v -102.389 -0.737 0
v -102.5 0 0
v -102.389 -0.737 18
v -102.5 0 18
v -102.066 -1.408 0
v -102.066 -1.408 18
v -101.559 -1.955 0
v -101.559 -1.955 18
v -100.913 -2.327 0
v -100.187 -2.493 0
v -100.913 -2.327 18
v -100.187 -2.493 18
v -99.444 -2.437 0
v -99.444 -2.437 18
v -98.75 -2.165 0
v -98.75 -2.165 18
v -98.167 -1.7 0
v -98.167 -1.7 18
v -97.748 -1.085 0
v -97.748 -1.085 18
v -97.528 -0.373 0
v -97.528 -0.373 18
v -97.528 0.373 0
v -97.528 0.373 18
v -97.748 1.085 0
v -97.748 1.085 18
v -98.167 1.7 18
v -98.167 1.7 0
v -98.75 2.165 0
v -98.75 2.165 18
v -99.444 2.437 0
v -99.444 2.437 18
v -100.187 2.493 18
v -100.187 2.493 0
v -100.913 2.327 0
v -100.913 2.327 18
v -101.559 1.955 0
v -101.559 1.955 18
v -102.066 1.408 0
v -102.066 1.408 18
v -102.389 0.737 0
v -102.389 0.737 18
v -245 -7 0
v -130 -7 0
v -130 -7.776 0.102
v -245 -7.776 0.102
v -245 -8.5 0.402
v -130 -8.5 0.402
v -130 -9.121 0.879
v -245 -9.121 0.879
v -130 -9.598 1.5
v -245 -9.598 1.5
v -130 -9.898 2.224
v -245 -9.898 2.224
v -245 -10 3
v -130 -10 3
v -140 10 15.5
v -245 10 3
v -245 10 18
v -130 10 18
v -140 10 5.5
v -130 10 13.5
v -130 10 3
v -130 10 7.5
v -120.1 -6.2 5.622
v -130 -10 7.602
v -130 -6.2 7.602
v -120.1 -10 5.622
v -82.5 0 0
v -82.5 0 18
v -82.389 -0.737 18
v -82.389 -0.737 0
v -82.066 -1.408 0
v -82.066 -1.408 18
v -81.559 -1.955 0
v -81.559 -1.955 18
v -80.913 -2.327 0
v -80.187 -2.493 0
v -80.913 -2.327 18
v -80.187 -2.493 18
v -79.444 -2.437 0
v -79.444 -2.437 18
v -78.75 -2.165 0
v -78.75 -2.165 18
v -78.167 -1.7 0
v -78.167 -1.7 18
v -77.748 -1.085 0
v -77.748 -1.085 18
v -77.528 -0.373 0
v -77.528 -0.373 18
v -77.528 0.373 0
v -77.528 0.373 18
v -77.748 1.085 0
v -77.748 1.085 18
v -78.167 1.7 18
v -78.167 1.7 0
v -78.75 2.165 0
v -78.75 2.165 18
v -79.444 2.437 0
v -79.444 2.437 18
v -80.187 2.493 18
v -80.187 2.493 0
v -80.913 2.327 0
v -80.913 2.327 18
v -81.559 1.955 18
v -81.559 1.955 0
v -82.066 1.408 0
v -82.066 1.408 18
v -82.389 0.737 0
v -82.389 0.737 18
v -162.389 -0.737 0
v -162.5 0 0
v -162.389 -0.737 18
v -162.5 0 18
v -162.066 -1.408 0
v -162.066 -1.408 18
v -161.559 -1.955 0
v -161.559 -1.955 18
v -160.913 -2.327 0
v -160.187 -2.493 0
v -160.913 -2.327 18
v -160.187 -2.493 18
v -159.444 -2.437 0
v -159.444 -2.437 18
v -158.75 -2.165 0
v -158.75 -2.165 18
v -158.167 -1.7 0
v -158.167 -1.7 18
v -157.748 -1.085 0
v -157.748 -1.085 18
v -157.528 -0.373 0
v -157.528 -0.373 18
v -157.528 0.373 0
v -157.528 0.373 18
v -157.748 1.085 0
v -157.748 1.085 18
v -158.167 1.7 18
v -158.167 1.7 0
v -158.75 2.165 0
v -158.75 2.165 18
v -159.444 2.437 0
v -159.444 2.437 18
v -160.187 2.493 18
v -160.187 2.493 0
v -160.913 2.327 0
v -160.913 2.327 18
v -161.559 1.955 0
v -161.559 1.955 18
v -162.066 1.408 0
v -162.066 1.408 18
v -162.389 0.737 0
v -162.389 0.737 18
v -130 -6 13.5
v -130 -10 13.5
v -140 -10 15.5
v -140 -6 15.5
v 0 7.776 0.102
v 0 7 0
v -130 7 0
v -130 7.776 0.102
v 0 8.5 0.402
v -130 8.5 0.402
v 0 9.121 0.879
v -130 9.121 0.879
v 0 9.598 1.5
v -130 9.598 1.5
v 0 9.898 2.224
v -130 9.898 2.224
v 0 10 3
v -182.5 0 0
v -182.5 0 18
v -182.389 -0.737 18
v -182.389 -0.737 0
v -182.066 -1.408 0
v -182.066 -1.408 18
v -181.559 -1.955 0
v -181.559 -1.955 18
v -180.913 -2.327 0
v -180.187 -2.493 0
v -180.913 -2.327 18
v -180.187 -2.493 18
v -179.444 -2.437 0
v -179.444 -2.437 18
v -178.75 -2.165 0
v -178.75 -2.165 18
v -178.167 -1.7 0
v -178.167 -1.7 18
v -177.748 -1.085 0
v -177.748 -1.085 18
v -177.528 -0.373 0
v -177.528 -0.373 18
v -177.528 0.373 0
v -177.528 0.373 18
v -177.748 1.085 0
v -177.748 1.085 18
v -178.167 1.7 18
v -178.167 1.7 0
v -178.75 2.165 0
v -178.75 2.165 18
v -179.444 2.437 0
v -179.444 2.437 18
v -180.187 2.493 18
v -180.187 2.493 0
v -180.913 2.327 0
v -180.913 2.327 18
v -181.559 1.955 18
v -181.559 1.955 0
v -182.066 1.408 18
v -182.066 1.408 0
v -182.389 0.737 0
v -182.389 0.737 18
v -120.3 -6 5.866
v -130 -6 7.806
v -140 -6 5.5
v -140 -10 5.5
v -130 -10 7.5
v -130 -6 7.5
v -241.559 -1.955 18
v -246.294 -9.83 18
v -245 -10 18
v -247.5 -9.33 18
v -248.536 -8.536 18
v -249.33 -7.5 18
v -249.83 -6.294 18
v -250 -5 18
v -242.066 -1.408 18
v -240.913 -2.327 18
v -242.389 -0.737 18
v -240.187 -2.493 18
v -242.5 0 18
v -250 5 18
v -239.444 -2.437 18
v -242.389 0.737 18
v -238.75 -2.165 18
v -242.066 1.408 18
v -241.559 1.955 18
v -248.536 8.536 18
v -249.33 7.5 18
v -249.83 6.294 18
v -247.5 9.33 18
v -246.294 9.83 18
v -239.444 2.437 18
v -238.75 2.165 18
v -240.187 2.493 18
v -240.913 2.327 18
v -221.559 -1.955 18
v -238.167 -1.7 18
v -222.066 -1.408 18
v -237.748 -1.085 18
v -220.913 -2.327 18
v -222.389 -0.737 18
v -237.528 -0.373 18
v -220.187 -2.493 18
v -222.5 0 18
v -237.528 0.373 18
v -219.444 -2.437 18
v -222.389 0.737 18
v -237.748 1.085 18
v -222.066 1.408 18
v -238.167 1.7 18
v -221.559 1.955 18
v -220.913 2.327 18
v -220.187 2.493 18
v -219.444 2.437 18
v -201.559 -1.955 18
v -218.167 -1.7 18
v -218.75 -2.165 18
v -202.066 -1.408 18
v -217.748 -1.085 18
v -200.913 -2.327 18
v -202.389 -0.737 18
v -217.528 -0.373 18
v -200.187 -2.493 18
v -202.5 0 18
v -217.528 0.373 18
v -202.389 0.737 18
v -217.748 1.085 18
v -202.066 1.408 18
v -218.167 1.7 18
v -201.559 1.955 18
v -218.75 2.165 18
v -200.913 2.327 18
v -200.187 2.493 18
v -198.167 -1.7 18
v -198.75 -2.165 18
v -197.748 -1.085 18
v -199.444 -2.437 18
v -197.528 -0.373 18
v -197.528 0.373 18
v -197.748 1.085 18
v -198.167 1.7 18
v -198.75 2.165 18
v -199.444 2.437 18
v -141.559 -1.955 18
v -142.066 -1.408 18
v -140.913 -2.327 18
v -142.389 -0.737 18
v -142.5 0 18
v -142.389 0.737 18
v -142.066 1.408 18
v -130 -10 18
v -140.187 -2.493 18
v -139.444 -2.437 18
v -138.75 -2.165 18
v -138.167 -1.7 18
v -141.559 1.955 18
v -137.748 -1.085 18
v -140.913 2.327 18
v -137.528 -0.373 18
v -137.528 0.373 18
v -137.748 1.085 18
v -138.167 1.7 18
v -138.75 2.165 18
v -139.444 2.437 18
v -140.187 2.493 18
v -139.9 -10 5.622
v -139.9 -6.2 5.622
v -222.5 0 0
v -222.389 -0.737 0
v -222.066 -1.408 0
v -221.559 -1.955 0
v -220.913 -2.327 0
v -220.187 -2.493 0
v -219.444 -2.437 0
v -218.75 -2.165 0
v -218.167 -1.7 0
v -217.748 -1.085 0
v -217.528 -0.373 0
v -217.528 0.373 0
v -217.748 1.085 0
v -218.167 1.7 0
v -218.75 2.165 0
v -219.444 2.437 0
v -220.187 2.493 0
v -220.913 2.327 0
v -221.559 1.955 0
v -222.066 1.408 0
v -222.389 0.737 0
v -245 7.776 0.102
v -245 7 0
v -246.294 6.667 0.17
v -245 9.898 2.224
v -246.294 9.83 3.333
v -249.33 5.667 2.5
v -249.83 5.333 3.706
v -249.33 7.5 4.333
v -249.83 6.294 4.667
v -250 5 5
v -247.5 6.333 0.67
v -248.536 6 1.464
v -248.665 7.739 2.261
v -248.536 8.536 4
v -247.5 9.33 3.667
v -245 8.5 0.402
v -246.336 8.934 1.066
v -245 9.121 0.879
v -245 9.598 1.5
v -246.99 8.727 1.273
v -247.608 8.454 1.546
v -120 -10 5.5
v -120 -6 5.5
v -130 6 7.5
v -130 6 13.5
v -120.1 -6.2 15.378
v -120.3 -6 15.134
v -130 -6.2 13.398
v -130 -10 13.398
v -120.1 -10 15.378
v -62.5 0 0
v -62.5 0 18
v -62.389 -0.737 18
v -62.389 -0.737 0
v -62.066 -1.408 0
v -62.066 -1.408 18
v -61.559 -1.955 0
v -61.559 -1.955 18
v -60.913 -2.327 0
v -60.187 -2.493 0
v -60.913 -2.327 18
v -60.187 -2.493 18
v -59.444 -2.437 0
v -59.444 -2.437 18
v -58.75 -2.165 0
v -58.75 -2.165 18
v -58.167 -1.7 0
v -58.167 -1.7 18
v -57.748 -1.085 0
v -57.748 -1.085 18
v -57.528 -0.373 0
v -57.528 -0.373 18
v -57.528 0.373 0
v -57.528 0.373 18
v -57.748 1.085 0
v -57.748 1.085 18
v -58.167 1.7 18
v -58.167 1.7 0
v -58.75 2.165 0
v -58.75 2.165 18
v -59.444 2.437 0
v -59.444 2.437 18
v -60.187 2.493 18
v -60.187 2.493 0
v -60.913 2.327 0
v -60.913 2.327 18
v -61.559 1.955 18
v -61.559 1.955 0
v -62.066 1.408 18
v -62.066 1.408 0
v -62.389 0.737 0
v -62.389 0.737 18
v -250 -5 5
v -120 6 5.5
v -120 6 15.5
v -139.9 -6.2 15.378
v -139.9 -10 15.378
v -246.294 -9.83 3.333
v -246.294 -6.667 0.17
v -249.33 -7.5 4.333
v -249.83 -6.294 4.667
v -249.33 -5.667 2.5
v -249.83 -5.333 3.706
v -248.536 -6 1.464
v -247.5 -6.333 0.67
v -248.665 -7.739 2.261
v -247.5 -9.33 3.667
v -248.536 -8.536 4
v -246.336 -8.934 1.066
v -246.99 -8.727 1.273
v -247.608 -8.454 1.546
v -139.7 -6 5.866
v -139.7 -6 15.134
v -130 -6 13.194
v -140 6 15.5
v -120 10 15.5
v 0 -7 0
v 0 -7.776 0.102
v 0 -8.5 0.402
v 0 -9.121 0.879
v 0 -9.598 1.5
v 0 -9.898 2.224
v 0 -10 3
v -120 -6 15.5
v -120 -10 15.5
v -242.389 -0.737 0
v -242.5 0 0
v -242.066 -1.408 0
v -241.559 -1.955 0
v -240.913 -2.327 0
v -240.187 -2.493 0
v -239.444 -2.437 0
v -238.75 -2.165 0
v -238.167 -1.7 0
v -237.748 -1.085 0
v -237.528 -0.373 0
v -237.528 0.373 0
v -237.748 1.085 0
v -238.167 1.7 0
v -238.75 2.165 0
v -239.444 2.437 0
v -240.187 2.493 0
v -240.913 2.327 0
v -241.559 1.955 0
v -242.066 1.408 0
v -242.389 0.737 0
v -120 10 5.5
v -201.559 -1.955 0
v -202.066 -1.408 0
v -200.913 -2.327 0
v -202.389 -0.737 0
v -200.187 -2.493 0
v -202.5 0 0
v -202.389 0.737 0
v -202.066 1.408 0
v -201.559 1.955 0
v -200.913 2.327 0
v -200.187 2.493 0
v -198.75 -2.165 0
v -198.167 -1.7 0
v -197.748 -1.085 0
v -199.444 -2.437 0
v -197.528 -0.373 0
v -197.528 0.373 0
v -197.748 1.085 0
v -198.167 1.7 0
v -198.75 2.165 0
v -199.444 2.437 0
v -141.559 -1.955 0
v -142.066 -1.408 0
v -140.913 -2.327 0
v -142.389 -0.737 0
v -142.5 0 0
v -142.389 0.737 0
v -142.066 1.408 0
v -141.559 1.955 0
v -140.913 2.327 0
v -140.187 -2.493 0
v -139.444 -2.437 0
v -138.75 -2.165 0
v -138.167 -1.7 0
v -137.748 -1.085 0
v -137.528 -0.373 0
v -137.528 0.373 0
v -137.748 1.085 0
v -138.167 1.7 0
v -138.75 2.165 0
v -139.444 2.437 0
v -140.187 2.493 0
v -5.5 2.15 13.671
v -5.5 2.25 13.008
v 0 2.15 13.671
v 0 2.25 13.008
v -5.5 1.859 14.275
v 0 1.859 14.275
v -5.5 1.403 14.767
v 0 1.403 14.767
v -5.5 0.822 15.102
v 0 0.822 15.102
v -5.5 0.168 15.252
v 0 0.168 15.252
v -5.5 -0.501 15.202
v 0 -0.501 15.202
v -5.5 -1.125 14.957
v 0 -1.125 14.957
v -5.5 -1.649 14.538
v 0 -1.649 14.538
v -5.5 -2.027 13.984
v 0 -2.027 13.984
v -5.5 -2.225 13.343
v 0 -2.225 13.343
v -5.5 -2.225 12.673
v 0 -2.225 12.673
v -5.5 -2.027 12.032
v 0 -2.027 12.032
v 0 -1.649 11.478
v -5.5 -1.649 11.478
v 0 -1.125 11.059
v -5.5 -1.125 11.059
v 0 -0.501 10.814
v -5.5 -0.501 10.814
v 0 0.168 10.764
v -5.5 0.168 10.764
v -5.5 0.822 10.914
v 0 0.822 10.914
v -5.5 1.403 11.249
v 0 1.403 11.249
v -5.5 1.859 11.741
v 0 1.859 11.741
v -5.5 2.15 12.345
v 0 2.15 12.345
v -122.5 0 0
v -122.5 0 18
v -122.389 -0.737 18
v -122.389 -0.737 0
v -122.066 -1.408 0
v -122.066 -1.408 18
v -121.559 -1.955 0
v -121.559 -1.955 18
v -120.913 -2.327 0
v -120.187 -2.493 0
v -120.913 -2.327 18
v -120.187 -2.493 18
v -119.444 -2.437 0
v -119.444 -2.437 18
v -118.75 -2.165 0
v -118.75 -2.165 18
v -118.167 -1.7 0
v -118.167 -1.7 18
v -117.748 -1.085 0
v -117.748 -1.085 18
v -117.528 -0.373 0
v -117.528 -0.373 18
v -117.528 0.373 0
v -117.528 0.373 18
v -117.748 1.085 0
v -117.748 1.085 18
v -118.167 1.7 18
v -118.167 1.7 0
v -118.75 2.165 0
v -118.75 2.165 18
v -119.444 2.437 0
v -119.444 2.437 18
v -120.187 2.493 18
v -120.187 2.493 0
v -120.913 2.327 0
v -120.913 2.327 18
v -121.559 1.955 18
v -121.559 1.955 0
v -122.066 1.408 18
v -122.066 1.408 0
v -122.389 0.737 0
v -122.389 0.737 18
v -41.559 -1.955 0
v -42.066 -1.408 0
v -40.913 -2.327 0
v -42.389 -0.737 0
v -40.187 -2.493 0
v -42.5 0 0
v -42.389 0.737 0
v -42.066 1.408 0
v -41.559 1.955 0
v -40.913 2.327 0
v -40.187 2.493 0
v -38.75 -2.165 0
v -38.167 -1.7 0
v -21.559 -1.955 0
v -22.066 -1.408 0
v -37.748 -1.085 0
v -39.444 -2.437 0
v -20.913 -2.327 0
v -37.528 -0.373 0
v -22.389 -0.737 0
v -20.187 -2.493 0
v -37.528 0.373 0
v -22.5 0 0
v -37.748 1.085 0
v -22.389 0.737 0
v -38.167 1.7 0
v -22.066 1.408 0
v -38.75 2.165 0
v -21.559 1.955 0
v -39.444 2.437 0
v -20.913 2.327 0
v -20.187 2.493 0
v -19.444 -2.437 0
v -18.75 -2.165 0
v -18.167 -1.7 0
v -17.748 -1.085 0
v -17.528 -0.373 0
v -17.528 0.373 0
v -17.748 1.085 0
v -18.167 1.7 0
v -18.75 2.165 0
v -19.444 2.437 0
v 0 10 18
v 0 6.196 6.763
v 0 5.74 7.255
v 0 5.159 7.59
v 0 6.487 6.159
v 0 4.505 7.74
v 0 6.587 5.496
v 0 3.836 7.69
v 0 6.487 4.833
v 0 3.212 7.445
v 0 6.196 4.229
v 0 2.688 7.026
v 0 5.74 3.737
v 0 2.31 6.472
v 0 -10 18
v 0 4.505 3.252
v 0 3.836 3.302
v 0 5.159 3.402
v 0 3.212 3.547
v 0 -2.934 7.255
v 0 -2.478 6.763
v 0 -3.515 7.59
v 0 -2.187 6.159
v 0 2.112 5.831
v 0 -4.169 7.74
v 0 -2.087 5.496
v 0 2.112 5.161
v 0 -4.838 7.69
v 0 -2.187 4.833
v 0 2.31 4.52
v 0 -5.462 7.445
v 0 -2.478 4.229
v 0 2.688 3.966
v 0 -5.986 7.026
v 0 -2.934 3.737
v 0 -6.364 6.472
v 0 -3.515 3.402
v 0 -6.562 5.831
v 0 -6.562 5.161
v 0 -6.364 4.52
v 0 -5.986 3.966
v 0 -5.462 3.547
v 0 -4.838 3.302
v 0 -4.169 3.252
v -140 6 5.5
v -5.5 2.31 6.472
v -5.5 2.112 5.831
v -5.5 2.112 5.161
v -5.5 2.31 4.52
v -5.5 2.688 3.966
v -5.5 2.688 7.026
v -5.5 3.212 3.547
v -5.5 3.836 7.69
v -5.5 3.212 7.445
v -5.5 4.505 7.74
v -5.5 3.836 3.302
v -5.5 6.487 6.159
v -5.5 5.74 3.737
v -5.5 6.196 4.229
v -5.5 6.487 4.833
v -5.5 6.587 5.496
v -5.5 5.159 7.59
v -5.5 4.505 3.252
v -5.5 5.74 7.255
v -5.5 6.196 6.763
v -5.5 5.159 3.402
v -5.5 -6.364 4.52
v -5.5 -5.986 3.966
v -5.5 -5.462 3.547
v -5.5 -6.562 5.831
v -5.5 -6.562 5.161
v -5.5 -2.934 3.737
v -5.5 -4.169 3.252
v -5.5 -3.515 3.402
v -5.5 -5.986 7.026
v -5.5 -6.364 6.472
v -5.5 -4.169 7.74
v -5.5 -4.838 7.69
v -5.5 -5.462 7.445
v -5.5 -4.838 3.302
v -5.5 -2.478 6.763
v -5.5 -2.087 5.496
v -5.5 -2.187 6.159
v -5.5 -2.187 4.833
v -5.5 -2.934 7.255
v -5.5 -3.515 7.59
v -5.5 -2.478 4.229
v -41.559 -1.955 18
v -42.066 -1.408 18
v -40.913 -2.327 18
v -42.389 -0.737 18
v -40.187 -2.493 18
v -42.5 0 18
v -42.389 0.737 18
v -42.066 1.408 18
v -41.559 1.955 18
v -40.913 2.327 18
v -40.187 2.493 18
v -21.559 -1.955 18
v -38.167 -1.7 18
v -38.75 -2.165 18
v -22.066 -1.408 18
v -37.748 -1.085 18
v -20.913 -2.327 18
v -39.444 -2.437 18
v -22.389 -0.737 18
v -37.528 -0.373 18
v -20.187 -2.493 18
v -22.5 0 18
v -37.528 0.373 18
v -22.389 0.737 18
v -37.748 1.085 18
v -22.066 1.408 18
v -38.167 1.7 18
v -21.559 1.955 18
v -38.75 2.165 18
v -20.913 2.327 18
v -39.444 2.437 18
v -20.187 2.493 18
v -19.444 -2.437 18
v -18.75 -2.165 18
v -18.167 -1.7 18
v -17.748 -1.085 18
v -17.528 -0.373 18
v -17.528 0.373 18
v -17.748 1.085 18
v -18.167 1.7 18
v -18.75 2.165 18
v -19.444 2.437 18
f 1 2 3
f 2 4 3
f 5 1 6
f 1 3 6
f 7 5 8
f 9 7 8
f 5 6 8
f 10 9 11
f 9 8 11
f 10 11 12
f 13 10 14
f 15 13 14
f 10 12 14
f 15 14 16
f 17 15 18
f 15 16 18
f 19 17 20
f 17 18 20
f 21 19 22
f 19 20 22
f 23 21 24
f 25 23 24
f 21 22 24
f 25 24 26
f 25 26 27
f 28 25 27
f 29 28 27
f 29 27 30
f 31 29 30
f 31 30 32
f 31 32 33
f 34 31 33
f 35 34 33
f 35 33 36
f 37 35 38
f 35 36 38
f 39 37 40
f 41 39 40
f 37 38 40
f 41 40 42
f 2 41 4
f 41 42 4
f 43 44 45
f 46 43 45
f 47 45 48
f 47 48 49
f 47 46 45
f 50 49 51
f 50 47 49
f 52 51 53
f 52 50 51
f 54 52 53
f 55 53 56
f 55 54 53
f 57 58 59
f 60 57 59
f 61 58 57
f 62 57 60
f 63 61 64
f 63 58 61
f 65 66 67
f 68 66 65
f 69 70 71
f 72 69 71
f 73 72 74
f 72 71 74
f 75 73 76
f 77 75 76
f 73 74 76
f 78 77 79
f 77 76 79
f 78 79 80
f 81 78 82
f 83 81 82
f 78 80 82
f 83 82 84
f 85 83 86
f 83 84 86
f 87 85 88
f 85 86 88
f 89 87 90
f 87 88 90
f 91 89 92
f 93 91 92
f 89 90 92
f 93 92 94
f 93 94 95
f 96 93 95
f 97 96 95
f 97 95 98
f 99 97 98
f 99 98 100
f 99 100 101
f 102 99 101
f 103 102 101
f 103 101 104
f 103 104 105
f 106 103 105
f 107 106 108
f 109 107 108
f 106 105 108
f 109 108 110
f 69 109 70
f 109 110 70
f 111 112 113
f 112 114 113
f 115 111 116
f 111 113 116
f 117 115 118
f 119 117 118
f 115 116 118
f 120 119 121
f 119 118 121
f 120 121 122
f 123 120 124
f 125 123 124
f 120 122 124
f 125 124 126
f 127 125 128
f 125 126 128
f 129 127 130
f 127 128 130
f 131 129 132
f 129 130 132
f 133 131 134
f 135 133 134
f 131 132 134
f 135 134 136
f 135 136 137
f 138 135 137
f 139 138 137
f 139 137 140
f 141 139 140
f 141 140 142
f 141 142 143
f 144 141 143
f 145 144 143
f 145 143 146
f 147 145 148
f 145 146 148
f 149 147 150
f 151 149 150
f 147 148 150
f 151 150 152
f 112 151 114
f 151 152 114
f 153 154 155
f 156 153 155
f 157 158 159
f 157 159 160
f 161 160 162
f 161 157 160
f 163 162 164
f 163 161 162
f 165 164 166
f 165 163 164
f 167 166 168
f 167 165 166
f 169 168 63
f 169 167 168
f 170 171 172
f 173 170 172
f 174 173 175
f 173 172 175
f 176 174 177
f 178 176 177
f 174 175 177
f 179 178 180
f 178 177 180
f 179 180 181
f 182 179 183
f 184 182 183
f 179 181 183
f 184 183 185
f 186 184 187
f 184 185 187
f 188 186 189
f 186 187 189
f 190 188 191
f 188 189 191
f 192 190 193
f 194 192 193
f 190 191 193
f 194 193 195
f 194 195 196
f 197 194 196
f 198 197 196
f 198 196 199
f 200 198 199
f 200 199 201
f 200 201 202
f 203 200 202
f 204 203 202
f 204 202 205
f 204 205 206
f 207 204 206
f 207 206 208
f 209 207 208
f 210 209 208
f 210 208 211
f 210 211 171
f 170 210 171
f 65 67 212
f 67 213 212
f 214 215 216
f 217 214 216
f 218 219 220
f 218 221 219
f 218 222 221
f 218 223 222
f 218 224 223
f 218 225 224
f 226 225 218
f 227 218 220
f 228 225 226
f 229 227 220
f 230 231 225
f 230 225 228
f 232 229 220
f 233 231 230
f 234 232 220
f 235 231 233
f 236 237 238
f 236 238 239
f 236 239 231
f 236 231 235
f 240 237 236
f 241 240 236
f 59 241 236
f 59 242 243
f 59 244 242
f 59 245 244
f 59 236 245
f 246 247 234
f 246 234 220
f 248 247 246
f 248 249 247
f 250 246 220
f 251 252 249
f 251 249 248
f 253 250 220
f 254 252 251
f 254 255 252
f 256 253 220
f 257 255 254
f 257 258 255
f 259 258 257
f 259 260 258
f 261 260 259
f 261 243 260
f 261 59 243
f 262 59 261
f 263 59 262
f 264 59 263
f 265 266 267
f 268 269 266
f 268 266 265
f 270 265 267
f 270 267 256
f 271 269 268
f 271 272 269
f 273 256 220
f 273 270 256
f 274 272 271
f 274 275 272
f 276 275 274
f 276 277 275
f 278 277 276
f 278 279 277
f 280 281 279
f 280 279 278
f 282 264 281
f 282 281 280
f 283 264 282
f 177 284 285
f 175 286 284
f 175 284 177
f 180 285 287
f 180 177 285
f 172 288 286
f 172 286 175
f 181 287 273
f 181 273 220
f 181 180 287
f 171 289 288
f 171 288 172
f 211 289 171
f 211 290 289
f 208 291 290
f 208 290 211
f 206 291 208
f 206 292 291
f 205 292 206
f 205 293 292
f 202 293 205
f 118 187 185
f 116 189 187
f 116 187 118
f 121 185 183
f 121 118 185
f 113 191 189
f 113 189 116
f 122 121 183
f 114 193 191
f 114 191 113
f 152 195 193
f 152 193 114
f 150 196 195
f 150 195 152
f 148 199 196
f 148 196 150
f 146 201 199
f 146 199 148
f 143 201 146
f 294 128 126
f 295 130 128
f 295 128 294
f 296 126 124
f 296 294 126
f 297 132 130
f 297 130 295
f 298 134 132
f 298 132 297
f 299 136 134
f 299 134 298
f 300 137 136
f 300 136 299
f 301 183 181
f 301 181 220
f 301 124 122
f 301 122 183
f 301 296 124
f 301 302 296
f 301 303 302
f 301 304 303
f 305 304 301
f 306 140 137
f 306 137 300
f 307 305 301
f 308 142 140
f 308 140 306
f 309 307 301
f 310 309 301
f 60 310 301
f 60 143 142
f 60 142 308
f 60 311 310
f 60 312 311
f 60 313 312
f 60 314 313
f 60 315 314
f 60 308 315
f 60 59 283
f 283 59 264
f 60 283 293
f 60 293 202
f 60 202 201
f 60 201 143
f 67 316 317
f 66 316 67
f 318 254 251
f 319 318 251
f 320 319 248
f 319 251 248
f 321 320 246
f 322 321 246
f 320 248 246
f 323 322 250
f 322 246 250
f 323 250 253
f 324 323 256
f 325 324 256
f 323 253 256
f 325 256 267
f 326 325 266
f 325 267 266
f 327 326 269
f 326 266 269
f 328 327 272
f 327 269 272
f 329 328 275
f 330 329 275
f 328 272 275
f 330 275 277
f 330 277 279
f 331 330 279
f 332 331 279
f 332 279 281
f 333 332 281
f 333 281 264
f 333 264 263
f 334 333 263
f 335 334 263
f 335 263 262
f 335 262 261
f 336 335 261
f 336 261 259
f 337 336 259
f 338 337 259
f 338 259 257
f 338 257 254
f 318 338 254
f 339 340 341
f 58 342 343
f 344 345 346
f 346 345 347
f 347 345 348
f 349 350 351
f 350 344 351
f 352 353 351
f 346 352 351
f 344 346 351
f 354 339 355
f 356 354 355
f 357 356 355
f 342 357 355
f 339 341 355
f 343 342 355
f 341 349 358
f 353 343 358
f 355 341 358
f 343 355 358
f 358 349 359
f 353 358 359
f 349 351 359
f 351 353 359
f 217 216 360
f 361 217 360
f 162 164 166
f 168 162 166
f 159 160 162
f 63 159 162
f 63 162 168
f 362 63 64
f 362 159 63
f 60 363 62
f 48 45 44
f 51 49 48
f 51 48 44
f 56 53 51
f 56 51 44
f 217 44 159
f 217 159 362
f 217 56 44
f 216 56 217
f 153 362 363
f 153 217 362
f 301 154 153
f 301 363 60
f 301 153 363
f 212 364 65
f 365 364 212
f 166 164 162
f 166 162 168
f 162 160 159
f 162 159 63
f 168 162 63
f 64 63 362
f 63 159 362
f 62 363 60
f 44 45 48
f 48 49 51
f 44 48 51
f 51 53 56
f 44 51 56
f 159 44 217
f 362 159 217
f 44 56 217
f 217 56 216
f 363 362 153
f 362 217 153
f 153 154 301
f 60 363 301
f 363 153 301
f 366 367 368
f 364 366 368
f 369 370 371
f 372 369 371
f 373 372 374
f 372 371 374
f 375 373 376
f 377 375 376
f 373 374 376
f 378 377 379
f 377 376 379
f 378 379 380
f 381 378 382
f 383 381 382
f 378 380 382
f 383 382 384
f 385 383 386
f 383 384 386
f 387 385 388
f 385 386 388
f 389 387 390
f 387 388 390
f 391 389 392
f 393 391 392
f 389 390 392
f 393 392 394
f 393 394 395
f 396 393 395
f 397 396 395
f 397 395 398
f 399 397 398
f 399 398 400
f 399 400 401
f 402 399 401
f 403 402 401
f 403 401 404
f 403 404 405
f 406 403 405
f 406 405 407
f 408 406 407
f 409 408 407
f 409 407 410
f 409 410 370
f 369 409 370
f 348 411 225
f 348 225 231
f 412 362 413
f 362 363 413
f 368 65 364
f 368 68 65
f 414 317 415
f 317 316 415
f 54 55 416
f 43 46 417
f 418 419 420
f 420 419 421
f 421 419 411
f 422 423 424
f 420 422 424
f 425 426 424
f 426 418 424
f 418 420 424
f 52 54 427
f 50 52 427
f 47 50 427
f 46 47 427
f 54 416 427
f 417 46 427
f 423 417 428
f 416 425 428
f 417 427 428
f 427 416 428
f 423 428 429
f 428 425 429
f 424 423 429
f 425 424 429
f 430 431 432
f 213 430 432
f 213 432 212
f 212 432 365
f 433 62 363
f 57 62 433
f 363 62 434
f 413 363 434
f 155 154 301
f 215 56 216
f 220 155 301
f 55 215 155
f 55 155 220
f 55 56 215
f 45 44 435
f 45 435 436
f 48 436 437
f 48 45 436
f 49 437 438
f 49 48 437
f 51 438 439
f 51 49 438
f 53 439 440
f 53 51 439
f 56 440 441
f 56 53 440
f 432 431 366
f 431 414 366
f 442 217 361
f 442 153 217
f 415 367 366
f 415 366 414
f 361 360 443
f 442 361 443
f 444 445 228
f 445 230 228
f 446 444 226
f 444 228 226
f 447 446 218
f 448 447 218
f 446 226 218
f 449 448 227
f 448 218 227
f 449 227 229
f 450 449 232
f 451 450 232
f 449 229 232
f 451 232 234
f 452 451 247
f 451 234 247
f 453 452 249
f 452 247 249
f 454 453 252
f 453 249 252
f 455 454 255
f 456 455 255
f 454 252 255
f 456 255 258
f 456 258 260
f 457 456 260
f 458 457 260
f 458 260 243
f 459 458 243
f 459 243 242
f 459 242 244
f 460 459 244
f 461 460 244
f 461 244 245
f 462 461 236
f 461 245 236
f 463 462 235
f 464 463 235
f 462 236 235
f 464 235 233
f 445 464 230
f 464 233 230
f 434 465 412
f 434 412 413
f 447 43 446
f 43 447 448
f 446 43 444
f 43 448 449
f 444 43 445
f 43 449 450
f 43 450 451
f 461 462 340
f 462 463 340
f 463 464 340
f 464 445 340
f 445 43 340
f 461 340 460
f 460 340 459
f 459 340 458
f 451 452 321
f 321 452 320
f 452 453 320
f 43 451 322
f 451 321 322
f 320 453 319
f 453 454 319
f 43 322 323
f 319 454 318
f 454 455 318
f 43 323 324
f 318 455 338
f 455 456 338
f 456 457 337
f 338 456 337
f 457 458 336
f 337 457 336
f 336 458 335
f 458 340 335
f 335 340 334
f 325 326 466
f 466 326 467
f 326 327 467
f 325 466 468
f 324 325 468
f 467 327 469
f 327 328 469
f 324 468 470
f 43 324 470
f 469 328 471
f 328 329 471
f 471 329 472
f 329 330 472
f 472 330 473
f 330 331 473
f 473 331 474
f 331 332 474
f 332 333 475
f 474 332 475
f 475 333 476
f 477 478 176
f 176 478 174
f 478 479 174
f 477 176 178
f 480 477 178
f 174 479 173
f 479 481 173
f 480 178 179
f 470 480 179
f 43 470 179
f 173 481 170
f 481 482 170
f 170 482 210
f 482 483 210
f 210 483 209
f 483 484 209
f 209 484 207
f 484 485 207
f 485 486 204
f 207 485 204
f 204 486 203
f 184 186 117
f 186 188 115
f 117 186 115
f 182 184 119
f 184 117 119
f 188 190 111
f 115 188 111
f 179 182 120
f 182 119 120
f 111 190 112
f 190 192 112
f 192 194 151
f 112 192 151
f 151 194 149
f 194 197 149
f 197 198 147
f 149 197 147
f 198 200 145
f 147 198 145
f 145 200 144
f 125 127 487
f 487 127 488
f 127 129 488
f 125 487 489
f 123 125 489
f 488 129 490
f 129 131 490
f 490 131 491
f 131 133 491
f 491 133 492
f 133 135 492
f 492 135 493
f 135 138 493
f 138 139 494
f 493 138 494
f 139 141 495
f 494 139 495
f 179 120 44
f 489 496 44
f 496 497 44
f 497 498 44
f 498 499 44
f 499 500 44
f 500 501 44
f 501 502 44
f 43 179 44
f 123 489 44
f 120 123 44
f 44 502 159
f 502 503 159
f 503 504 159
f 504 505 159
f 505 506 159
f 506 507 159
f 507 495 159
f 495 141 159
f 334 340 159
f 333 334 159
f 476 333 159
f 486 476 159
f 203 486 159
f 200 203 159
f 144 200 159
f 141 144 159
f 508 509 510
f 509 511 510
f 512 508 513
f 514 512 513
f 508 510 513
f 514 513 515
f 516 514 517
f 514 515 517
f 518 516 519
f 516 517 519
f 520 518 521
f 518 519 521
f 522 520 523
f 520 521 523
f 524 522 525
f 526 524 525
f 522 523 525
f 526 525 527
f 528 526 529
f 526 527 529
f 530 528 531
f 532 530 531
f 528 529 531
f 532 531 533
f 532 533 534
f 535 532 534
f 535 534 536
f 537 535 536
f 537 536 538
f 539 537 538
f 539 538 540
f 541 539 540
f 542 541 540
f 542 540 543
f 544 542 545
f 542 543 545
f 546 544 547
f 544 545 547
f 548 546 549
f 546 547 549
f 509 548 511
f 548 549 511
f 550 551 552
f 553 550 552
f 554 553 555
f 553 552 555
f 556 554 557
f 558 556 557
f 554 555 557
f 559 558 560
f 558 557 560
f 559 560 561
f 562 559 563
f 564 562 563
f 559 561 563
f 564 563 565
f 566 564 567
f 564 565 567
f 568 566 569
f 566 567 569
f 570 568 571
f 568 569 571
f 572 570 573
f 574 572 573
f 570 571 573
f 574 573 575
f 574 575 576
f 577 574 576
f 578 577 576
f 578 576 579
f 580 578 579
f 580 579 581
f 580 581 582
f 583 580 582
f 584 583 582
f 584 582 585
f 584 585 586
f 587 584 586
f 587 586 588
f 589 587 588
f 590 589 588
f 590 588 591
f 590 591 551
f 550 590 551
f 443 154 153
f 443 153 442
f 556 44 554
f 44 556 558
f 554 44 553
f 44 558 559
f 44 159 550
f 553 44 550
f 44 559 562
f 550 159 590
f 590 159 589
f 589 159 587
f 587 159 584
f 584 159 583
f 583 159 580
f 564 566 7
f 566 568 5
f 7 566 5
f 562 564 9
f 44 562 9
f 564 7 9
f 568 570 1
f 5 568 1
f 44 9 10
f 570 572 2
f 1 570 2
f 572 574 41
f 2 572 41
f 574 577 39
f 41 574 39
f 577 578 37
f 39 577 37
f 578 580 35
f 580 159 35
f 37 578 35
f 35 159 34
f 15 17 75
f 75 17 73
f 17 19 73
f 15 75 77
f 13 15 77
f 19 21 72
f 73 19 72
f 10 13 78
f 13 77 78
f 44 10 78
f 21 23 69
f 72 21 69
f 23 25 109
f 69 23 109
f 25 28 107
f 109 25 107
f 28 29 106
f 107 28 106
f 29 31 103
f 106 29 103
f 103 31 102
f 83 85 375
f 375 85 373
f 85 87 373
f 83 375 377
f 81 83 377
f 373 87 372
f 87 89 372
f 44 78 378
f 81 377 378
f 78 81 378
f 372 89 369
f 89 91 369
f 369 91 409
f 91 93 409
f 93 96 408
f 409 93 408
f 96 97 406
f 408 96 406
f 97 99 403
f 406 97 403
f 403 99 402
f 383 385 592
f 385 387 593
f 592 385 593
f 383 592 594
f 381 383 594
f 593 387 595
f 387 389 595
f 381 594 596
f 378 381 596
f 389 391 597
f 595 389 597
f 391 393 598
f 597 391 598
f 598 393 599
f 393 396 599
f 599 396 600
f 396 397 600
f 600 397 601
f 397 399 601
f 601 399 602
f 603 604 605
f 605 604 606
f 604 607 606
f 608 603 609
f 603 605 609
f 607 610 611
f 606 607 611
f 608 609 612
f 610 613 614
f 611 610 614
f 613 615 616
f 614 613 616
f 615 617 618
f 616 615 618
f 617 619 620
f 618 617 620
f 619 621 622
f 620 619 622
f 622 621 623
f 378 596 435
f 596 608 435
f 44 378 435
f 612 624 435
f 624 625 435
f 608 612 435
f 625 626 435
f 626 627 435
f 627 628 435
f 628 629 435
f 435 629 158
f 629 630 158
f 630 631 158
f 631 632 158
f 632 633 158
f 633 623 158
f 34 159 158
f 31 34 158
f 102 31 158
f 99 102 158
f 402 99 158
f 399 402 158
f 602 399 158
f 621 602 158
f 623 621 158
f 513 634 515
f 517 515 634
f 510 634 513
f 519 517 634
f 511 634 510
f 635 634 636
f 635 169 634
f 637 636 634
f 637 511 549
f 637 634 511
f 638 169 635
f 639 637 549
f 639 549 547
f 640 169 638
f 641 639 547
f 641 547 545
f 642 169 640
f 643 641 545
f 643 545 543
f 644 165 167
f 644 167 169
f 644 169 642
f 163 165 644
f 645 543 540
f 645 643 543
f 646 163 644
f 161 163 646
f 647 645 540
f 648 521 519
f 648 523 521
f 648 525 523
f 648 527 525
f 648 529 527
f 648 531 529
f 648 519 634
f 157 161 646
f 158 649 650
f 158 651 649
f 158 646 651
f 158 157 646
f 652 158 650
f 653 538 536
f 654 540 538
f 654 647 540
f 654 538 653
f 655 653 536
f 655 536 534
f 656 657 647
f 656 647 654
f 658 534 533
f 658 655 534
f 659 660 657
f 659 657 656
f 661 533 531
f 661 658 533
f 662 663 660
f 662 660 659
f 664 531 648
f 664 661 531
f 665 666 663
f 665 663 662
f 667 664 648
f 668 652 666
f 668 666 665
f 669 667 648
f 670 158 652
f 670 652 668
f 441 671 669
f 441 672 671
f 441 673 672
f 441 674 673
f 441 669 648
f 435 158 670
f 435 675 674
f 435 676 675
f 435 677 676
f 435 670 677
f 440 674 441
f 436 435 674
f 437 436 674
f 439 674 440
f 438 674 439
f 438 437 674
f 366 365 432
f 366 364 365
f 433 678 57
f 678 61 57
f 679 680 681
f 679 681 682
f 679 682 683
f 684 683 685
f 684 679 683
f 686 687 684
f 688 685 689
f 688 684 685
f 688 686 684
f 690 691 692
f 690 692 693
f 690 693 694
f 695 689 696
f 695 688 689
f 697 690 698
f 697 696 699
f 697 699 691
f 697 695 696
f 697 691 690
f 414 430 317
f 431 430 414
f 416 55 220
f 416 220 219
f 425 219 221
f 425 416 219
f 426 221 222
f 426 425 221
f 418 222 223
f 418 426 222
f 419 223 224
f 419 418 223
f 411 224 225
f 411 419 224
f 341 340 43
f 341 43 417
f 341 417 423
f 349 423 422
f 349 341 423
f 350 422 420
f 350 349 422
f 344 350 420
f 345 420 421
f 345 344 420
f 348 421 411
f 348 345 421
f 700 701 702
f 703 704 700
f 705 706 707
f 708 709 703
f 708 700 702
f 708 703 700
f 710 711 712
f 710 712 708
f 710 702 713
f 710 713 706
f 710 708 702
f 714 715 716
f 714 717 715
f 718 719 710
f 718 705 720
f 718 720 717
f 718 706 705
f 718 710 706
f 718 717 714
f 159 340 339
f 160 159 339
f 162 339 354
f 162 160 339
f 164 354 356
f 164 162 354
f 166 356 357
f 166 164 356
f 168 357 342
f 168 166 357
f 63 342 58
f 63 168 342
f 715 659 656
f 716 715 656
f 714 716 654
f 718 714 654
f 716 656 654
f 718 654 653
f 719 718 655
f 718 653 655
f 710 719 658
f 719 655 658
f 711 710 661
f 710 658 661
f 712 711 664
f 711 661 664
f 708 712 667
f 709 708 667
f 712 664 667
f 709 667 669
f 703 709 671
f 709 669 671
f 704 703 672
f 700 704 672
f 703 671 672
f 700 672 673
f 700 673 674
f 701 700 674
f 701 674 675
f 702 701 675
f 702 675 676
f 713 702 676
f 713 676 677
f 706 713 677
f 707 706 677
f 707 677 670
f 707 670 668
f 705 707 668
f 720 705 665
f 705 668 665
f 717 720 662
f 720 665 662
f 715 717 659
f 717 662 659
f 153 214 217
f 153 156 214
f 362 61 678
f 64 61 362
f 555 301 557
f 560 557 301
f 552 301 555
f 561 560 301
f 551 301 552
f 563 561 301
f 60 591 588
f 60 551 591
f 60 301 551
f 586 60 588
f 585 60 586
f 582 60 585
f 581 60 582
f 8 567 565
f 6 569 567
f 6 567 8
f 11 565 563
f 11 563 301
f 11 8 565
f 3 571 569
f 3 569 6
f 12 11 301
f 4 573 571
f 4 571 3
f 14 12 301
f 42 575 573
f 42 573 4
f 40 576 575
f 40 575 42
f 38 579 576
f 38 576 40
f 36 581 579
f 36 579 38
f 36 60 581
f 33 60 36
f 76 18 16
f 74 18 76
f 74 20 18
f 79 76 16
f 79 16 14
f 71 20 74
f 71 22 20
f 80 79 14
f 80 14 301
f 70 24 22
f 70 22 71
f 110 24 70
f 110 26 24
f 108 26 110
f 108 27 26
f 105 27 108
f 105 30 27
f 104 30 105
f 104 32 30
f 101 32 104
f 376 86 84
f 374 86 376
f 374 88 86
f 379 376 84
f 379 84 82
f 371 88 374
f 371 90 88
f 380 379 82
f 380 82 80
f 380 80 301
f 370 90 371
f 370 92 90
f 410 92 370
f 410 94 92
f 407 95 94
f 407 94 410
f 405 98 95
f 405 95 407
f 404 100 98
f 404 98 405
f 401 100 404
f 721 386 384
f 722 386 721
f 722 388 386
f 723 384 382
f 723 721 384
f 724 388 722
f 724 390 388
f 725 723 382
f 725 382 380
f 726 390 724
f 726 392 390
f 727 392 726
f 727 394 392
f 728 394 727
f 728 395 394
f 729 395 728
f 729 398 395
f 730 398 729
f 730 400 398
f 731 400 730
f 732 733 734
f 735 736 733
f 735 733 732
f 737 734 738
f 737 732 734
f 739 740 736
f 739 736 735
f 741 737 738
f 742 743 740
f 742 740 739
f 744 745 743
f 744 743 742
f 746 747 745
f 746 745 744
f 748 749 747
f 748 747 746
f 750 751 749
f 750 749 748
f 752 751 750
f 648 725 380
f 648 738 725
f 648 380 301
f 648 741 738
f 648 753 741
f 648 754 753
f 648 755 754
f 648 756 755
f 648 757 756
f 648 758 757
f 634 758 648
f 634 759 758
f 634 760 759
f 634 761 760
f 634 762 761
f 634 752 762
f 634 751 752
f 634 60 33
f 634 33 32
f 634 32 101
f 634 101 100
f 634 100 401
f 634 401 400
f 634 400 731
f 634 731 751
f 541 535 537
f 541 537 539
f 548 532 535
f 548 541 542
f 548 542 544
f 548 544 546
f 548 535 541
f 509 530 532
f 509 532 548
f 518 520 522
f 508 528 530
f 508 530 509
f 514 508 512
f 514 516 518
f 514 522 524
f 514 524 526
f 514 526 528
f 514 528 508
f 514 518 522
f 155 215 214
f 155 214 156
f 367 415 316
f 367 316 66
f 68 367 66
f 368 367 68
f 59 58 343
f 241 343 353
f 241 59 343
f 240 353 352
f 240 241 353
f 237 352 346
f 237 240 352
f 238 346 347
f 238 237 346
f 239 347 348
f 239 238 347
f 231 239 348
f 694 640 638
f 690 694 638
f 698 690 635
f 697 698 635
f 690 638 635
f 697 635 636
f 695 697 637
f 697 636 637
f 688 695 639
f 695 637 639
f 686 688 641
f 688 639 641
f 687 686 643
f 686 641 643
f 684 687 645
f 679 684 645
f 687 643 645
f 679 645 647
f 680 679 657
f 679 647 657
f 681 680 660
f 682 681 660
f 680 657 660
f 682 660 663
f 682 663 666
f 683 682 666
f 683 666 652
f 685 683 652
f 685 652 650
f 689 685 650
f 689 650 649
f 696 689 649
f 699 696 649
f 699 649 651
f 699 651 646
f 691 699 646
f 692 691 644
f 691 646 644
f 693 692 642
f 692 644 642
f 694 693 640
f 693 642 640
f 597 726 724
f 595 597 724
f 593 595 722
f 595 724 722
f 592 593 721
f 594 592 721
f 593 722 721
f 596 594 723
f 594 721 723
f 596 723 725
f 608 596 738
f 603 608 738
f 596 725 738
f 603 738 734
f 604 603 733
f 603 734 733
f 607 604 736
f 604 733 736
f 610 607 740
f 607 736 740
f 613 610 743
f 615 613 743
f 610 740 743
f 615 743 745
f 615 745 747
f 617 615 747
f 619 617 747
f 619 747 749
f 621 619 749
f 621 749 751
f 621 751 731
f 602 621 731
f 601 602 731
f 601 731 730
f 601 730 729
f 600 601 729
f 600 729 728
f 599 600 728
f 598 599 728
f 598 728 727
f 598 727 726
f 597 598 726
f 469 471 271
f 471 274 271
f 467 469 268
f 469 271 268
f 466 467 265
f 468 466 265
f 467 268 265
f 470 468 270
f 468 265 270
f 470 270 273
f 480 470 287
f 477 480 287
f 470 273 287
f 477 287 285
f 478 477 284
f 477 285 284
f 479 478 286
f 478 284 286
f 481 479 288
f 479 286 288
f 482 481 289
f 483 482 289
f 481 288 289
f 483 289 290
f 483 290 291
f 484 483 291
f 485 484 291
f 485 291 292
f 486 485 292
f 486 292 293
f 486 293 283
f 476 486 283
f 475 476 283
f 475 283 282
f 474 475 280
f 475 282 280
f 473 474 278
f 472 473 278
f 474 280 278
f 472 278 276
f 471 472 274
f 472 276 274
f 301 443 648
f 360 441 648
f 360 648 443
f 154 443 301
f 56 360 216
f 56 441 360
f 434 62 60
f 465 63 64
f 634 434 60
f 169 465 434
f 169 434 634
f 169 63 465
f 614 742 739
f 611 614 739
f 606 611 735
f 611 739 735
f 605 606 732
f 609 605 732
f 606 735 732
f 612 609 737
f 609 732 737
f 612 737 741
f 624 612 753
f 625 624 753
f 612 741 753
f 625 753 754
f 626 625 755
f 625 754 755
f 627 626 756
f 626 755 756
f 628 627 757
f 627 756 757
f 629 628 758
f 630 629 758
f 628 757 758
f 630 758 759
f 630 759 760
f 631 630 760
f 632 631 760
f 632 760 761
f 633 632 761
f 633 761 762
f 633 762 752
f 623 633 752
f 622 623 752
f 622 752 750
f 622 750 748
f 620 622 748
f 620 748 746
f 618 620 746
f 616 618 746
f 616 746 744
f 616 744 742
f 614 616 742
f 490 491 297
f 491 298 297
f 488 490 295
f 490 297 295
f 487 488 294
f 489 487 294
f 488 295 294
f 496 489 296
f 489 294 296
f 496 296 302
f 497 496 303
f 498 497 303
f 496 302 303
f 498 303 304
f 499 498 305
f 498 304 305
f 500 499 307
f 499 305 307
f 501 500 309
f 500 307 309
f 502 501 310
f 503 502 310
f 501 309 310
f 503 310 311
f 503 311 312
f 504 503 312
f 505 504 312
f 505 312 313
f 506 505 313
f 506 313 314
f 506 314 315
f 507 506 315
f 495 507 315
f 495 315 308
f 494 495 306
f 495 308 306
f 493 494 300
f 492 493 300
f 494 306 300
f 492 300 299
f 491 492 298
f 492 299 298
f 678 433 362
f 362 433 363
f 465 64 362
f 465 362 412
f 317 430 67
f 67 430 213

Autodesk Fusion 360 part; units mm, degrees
sketch "Sketch1" plane through (0, 0, 0) normal (0, 0, 1) x (1, 0, 0)
  line L0 (0, 10) -> (0, -10)
  line L1 (0, -10) -> (-250, -10)
  line L2 (-250, -10) -> (-250, 10)
  line L3 (-250, 10) -> (0, 10)
  line L4 (0, -10) -> (-250, 10) construction
  line L5 (-250, -10) -> (0, 10) construction
  point P0 (-125, 0)
  point P1 (-250, 0)
  dimension "d1" = 20
  dimension "d36" = 250
extrude "Extrude1" add sketch "Sketch1" along normal blind 18 makes body 1
sketch "Sketch2" plane through (0, 0, 18) normal (0, 0, 1) x (-1, 0, 0)
  line L0 (250, -10) -> (250, 10)
  line L1 (250, 10) -> (0, 10)
  line L2 (0, 10) -> (0, -10)
  line L3 (0, -10) -> (250, -10)
  circle A0 centre (280, 0) radius 2
  circle A1 centre (260, 0) radius 2
  circle A2 centre (240, 0) radius 2
  circle A3 centre (220, 0) radius 2
  circle A4 centre (200, 0) radius 2
  circle A5 centre (180, 0) radius 2
  circle A6 centre (160, 0) radius 2
  circle A7 centre (140, 0) radius 2
  circle A8 centre (120, 0) radius 2
  circle A9 centre (100, 0) radius 2
  circle A10 centre (80, 0) radius 2
  circle A11 centre (60, 0) radius 2
  circle A12 centre (40, 0) radius 2
  circle A13 centre (20, 0) radius 2
  point P0 (20, 0)
  point P1 (40, 0)
  point P2 (60, 0)
  point P3 (80, 0)
  point P4 (100, 0)
  point P5 (120, 0)
  point P6 (140, 0)
  point P7 (160, 0)
  point P8 (180, 0)
  point P9 (200, 0)
  point P10 (220, 0)
  point P11 (240, 0)
  point P12 (260, 0)
  point P13 (280, 0)
  dimension "d9" = 20
  dimension "d10" = 0
  dimension "d11" = 4
  dimension "d12" = 4
  dimension "d13" = 4
  dimension "d14" = 4
  dimension "d15" = 4
  dimension "d16" = 4
  dimension "d17" = 4
  dimension "d18" = 4
  dimension "d19" = 4
  dimension "d20" = 4
  dimension "d21" = 4
  dimension "d22" = 4
  dimension "d23" = 4
  dimension "d24" = 4
extrude "Extrude2" cut sketch "Sketch2" against normal blind 90 contours A0 | A1 | A2 | A3 | A4 | A5 | A6 | A7 | A8 | A9 | A10 | A11 | A12 | A13 bodies 1
fillet "Fillet1" radius 3 2 edges at (-125, -10, 0) (-125, 10, 0) on bodies 1
sketch "Sketch3" plane through (0, 0, 0) normal (1, 0, 0) x (0, 1, 0)
  arc A0 (7, 0) -> (10, 3) centre (7, 3) ccw
  line L0 (10, 3) -> (10, 18)
  line L1 (10, 18) -> (-10, 18)
  line L2 (-10, 18) -> (-10, 3)
  arc A1 (-10, 3) -> (-7, 0) centre (-7, 3) ccw
  line L3 (-7, 0) -> (7, 0)
  line L4 (0, 36) -> (0, 0) construction
  line L5 (0, 13.008) -> (-4.337, 5.496) construction
  line L6 (-4.337, 5.496) -> (4.337, 5.496) construction
  line L7 (4.337, 5.496) -> (0, 13.008) construction
  circle A2 centre (0, 13.008) radius 2.25
  circle A3 centre (4.337, 5.496) radius 2.25
  circle A4 centre (-4.337, 5.496) radius 2.25
  point P0 (0, 18)
  point P1 (0, 8)
  dimension "d29" = 8.6741
  dimension "d30" = 8
  dimension "d31" = 4.5
  dimension "d32" = 4.5
  dimension "d33" = 4.5
extrude "Extrude3" cut sketch "Sketch3" against normal blind 5.5 contours A2 | A3 | A4 bodies 1
sketch "Sketch4" plane through (0, -10, 0) normal (0, -1, 0) x (1, 0, 0)
  line L0 (-250, 3) -> (0, 3)
  line L1 (0, 3) -> (0, 18)
  line L2 (0, 18) -> (-250, 18)
  line L3 (-250, 18) -> (-250, 3)
fillet "Fillet2" radius 5 5 edges at (-250, 10, 10.5) (-250, 9.1213, 0.8787) (-250, 0, 0) (-250, -9.1213, 0.8787) (-250, -10, 10.5) on bodies 1
ref_plane "WorkPlane1" through (-130, 0, 9) normal (1, 0, 0) x (0, 1, 0)
split "Split1" by plane through (-130, 0, 9) normal (1, 0, 0) bodies 1 makes body 2 at (-6, 0, 18)
sketch "Sketch5" plane through (0, -10, 0) normal (0, -1, 0) x (1, 0, 0)
  line L0 (-130, 3) -> (-130, 18)
  line L1 (-130, 18) -> (-245, 18)
  line L2 (-245, 18) -> (-245, 3)
  line L3 (-245, 3) -> (-130, 3)
  line L4 (-130, 18) -> (-130, 3)
  line L5 (-130, 3) -> (0, 3)
  line L6 (0, 3) -> (0, 18)
  line L7 (0, 18) -> (-130, 18)
  line L8 (-120, 15.5) -> (-140, 15.5) construction
  line L9 (-140, 15.5) -> (-140, 5.5) construction
  line L10 (-140, 5.5) -> (-120, 5.5) construction
  line L11 (-120, 5.5) -> (-120, 15.5) construction
  line L12 (-120, 15.5) -> (-140, 5.5) construction
  line L13 (-140, 15.5) -> (-120, 5.5) construction
  line L14 (-120, 5.5) -> (-120, 15.5)
  line L15 (-130, 13.5) -> (-140, 15.5)
  line L16 (-140, 5.5) -> (-140, 15.5)
  line L17 (-140, 5.5) -> (-130, 7.5)
  line L18 (-130, 7.5) -> (-120, 5.5)
  line L19 (-130, 13.5) -> (-120, 15.5)
  point P0 (-130, 10.5)
  point P1 (-130, 10.5)
  dimension "d41" = 20
  dimension "d42" = 10
  dimension "d43" = 3
  dimension "d44" = 3
move_face "OffsetFaces1" offset -0.5 12 faces at (-21.9901, 0.1991, 12) (-41.9901, 0.1991, 12) (-61.9901, 0.1991, 12) (-78.4679, -1.2856, 6) (-98.6766, -1.4996, 12) (-118.6766, -1.4996, 12) (-141.1675, -1.6239, 6) (-161.1675, -1.6239, 6) (-181.1675, -1.6239, 6) (-199.0876, 1.7797, 12) (-221.1675, -1.6239, 6) (-239.0876, 1.7797, 12) on bodies 1 2
extrude "Extrude4" cut sketch "Sketch5" against normal blind 4 contours L0 L4 L15 L16 L17 | L0 L4 L14 L18 L19 bodies 1 2
extrude "Extrude5" cut sketch "Sketch5" along normal blind 4 from surface at -20 contours L0 L4 L15 L16 L17 | L0 L4 L14 L18 L19 bodies 1 2
extrude "Extrude6" add sketch "Sketch5" against normal blind 4 separate body contours L0 L4 L15 L16 L17 | L0 L4 L14 L18 L19 makes body 3
chamfer "Chamfer1" distance 0.3 angle 45 1 faces at (-136.6667, -6, 11.5) tangent chain off on bodies 3
move_face "OffsetFaces2" offset -0.1 6 faces at (-123.3333, -7.5333, 14.8333) (-136.6667, -7.5333, 14.8333) (-140, -7.5333, 12.1667) (-136.6667, -8.7667, 6.1667) (-126.6667, -8.7667, 6.8333) (-120, -7.5333, 12.1667) on bodies 3
equation "supportheight = 300"
